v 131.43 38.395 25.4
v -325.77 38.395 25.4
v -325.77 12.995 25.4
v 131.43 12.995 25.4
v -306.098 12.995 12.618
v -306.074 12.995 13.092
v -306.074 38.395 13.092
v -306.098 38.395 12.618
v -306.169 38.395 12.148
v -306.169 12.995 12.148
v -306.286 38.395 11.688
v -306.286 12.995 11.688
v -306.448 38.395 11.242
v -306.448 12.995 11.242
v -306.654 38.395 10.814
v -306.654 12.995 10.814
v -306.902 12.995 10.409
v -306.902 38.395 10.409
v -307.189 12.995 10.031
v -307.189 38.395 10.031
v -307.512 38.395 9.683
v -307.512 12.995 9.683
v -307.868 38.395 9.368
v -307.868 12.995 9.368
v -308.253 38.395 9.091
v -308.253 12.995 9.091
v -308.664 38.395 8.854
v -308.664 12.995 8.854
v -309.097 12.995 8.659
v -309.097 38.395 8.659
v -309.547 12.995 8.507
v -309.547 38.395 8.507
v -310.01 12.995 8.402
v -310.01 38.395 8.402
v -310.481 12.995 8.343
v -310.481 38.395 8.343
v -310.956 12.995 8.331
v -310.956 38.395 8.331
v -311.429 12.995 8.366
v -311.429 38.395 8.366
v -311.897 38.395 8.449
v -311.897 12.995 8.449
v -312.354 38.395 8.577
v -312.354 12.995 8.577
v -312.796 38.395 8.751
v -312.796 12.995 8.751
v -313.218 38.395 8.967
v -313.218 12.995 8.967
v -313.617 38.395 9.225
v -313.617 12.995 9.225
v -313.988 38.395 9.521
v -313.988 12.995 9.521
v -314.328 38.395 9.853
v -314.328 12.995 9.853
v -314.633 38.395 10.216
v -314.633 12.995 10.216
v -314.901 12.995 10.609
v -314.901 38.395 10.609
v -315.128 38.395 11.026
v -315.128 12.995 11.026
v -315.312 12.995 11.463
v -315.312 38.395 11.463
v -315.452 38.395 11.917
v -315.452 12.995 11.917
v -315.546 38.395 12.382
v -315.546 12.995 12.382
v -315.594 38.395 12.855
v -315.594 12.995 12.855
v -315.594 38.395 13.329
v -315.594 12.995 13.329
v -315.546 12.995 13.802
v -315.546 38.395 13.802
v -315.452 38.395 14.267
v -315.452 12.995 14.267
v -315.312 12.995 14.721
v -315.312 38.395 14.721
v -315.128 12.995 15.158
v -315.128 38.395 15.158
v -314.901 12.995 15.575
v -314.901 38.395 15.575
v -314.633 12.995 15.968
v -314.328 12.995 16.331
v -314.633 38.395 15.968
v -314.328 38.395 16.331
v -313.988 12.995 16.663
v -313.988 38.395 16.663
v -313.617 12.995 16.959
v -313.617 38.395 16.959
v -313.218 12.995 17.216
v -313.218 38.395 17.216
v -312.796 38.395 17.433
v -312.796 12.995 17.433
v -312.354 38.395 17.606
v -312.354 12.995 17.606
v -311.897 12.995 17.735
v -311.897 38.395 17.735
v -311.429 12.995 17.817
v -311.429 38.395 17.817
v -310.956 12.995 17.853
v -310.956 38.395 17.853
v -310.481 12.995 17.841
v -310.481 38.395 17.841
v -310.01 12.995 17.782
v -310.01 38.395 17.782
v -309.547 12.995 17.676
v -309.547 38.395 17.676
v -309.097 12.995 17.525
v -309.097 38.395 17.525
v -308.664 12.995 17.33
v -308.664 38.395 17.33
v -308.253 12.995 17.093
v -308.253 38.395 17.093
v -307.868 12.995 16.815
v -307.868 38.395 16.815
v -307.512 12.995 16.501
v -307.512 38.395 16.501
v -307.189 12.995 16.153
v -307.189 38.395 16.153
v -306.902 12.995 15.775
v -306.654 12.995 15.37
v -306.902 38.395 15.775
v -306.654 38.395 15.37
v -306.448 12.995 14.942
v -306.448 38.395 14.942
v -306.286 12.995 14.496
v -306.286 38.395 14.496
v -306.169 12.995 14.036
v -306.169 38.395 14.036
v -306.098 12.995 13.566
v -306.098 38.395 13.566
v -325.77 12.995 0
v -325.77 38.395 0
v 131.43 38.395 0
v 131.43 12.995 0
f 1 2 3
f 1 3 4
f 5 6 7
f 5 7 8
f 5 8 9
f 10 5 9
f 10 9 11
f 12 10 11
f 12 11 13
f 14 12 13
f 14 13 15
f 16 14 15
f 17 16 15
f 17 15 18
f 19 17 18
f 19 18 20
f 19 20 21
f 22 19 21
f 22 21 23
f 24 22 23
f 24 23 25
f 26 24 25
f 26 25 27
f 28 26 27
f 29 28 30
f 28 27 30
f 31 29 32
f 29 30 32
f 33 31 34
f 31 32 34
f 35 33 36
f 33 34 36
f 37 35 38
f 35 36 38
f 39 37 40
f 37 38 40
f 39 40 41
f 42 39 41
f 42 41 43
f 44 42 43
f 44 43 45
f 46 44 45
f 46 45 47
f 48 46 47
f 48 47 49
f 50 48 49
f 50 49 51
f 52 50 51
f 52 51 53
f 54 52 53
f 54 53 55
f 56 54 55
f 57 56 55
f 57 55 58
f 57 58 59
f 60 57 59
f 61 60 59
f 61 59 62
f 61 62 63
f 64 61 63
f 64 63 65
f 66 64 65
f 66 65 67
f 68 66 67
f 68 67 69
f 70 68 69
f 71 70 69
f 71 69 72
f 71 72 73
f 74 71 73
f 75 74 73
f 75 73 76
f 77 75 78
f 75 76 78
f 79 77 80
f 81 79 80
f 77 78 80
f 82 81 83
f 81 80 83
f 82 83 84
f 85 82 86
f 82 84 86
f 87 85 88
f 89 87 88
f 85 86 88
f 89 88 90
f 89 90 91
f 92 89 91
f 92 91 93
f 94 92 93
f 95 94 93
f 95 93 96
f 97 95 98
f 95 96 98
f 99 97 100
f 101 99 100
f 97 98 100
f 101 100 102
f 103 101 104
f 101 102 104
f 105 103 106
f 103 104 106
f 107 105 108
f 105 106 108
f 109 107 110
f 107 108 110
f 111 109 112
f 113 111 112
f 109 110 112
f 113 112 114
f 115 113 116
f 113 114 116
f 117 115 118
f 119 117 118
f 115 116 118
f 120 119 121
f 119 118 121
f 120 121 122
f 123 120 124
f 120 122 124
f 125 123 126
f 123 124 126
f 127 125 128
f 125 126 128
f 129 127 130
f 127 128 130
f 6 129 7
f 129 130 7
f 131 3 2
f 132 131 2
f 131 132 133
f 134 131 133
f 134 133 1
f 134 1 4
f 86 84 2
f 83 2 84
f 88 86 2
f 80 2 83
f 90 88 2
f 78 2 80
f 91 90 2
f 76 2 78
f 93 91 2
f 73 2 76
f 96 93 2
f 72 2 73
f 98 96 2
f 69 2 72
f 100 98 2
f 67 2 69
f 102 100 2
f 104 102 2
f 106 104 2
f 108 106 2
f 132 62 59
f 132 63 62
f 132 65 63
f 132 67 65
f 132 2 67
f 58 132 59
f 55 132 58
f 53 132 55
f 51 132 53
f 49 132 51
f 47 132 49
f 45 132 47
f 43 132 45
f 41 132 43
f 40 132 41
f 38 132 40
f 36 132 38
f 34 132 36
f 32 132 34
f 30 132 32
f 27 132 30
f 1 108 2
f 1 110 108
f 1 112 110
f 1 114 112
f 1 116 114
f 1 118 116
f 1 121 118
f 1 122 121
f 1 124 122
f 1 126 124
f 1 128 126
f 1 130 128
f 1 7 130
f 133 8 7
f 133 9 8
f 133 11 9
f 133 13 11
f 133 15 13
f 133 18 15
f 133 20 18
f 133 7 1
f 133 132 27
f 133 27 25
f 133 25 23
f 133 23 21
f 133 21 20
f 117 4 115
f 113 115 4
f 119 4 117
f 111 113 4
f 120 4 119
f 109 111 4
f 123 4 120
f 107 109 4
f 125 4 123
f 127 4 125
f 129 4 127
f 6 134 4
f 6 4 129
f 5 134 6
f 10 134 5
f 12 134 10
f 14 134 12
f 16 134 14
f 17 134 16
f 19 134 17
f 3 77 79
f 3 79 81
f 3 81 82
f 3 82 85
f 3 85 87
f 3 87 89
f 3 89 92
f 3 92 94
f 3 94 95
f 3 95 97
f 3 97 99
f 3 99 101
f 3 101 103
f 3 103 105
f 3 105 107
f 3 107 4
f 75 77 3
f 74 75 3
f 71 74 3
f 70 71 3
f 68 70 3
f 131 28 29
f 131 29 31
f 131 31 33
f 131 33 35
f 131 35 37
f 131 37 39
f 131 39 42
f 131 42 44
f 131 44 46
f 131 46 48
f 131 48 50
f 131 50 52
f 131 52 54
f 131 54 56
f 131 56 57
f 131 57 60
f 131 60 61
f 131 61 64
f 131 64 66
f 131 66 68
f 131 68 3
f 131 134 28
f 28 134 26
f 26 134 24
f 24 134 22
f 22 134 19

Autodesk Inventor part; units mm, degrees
ref_plane "YZ Plane" through (0, 0, 0) normal (1, 0, 0) x (0, 1, 0)
ref_plane "XZ Plane" through (0, 0, 0) normal (0, 1, 0) x (-1, 0, 0)
ref_plane "Work Plane1" through (0, 0, 0) normal (0, 0, 1) x (1, 0, 0)
sketch "Sketch1" plane through (0, 0, 0) normal (0, 0, 1) x (1, 0, 0)
  line L0 (-165.1, -139.7) -> (165.1, -139.7) projected
  line L1 (-165.1, -139.7) -> (165.1, -139.7) construction
  line L2 (-325.7698, 38.3953) -> (131.4302, 38.3953)
  line L3 (131.4302, 38.3953) -> (131.4302, 12.9953)
  line L4 (131.4302, 12.9953) -> (-325.7698, 12.9953)
  line L5 (-325.7698, 12.9953) -> (-325.7698, 38.3953)
  point P0 (0, 0)
  dimension "d0" = 25.4
  dimension "d1" = 457.2
extrude "Extrusion1" add sketch "Sketch1" along normal blind 25.4
sketch "Sketch2" plane through (-325.7698, 38.3953, 0) normal (0, 1, 0) x (1, 0, 0)
  circle A0 centre (14.9328, -13.0919) radius 4.7625
  point P0 (325.7698, 0)
  dimension "d4" = 9.525
extrude "Extrusion2" cut sketch "Sketch2" against normal through all
properties part number "Intake Arm"
